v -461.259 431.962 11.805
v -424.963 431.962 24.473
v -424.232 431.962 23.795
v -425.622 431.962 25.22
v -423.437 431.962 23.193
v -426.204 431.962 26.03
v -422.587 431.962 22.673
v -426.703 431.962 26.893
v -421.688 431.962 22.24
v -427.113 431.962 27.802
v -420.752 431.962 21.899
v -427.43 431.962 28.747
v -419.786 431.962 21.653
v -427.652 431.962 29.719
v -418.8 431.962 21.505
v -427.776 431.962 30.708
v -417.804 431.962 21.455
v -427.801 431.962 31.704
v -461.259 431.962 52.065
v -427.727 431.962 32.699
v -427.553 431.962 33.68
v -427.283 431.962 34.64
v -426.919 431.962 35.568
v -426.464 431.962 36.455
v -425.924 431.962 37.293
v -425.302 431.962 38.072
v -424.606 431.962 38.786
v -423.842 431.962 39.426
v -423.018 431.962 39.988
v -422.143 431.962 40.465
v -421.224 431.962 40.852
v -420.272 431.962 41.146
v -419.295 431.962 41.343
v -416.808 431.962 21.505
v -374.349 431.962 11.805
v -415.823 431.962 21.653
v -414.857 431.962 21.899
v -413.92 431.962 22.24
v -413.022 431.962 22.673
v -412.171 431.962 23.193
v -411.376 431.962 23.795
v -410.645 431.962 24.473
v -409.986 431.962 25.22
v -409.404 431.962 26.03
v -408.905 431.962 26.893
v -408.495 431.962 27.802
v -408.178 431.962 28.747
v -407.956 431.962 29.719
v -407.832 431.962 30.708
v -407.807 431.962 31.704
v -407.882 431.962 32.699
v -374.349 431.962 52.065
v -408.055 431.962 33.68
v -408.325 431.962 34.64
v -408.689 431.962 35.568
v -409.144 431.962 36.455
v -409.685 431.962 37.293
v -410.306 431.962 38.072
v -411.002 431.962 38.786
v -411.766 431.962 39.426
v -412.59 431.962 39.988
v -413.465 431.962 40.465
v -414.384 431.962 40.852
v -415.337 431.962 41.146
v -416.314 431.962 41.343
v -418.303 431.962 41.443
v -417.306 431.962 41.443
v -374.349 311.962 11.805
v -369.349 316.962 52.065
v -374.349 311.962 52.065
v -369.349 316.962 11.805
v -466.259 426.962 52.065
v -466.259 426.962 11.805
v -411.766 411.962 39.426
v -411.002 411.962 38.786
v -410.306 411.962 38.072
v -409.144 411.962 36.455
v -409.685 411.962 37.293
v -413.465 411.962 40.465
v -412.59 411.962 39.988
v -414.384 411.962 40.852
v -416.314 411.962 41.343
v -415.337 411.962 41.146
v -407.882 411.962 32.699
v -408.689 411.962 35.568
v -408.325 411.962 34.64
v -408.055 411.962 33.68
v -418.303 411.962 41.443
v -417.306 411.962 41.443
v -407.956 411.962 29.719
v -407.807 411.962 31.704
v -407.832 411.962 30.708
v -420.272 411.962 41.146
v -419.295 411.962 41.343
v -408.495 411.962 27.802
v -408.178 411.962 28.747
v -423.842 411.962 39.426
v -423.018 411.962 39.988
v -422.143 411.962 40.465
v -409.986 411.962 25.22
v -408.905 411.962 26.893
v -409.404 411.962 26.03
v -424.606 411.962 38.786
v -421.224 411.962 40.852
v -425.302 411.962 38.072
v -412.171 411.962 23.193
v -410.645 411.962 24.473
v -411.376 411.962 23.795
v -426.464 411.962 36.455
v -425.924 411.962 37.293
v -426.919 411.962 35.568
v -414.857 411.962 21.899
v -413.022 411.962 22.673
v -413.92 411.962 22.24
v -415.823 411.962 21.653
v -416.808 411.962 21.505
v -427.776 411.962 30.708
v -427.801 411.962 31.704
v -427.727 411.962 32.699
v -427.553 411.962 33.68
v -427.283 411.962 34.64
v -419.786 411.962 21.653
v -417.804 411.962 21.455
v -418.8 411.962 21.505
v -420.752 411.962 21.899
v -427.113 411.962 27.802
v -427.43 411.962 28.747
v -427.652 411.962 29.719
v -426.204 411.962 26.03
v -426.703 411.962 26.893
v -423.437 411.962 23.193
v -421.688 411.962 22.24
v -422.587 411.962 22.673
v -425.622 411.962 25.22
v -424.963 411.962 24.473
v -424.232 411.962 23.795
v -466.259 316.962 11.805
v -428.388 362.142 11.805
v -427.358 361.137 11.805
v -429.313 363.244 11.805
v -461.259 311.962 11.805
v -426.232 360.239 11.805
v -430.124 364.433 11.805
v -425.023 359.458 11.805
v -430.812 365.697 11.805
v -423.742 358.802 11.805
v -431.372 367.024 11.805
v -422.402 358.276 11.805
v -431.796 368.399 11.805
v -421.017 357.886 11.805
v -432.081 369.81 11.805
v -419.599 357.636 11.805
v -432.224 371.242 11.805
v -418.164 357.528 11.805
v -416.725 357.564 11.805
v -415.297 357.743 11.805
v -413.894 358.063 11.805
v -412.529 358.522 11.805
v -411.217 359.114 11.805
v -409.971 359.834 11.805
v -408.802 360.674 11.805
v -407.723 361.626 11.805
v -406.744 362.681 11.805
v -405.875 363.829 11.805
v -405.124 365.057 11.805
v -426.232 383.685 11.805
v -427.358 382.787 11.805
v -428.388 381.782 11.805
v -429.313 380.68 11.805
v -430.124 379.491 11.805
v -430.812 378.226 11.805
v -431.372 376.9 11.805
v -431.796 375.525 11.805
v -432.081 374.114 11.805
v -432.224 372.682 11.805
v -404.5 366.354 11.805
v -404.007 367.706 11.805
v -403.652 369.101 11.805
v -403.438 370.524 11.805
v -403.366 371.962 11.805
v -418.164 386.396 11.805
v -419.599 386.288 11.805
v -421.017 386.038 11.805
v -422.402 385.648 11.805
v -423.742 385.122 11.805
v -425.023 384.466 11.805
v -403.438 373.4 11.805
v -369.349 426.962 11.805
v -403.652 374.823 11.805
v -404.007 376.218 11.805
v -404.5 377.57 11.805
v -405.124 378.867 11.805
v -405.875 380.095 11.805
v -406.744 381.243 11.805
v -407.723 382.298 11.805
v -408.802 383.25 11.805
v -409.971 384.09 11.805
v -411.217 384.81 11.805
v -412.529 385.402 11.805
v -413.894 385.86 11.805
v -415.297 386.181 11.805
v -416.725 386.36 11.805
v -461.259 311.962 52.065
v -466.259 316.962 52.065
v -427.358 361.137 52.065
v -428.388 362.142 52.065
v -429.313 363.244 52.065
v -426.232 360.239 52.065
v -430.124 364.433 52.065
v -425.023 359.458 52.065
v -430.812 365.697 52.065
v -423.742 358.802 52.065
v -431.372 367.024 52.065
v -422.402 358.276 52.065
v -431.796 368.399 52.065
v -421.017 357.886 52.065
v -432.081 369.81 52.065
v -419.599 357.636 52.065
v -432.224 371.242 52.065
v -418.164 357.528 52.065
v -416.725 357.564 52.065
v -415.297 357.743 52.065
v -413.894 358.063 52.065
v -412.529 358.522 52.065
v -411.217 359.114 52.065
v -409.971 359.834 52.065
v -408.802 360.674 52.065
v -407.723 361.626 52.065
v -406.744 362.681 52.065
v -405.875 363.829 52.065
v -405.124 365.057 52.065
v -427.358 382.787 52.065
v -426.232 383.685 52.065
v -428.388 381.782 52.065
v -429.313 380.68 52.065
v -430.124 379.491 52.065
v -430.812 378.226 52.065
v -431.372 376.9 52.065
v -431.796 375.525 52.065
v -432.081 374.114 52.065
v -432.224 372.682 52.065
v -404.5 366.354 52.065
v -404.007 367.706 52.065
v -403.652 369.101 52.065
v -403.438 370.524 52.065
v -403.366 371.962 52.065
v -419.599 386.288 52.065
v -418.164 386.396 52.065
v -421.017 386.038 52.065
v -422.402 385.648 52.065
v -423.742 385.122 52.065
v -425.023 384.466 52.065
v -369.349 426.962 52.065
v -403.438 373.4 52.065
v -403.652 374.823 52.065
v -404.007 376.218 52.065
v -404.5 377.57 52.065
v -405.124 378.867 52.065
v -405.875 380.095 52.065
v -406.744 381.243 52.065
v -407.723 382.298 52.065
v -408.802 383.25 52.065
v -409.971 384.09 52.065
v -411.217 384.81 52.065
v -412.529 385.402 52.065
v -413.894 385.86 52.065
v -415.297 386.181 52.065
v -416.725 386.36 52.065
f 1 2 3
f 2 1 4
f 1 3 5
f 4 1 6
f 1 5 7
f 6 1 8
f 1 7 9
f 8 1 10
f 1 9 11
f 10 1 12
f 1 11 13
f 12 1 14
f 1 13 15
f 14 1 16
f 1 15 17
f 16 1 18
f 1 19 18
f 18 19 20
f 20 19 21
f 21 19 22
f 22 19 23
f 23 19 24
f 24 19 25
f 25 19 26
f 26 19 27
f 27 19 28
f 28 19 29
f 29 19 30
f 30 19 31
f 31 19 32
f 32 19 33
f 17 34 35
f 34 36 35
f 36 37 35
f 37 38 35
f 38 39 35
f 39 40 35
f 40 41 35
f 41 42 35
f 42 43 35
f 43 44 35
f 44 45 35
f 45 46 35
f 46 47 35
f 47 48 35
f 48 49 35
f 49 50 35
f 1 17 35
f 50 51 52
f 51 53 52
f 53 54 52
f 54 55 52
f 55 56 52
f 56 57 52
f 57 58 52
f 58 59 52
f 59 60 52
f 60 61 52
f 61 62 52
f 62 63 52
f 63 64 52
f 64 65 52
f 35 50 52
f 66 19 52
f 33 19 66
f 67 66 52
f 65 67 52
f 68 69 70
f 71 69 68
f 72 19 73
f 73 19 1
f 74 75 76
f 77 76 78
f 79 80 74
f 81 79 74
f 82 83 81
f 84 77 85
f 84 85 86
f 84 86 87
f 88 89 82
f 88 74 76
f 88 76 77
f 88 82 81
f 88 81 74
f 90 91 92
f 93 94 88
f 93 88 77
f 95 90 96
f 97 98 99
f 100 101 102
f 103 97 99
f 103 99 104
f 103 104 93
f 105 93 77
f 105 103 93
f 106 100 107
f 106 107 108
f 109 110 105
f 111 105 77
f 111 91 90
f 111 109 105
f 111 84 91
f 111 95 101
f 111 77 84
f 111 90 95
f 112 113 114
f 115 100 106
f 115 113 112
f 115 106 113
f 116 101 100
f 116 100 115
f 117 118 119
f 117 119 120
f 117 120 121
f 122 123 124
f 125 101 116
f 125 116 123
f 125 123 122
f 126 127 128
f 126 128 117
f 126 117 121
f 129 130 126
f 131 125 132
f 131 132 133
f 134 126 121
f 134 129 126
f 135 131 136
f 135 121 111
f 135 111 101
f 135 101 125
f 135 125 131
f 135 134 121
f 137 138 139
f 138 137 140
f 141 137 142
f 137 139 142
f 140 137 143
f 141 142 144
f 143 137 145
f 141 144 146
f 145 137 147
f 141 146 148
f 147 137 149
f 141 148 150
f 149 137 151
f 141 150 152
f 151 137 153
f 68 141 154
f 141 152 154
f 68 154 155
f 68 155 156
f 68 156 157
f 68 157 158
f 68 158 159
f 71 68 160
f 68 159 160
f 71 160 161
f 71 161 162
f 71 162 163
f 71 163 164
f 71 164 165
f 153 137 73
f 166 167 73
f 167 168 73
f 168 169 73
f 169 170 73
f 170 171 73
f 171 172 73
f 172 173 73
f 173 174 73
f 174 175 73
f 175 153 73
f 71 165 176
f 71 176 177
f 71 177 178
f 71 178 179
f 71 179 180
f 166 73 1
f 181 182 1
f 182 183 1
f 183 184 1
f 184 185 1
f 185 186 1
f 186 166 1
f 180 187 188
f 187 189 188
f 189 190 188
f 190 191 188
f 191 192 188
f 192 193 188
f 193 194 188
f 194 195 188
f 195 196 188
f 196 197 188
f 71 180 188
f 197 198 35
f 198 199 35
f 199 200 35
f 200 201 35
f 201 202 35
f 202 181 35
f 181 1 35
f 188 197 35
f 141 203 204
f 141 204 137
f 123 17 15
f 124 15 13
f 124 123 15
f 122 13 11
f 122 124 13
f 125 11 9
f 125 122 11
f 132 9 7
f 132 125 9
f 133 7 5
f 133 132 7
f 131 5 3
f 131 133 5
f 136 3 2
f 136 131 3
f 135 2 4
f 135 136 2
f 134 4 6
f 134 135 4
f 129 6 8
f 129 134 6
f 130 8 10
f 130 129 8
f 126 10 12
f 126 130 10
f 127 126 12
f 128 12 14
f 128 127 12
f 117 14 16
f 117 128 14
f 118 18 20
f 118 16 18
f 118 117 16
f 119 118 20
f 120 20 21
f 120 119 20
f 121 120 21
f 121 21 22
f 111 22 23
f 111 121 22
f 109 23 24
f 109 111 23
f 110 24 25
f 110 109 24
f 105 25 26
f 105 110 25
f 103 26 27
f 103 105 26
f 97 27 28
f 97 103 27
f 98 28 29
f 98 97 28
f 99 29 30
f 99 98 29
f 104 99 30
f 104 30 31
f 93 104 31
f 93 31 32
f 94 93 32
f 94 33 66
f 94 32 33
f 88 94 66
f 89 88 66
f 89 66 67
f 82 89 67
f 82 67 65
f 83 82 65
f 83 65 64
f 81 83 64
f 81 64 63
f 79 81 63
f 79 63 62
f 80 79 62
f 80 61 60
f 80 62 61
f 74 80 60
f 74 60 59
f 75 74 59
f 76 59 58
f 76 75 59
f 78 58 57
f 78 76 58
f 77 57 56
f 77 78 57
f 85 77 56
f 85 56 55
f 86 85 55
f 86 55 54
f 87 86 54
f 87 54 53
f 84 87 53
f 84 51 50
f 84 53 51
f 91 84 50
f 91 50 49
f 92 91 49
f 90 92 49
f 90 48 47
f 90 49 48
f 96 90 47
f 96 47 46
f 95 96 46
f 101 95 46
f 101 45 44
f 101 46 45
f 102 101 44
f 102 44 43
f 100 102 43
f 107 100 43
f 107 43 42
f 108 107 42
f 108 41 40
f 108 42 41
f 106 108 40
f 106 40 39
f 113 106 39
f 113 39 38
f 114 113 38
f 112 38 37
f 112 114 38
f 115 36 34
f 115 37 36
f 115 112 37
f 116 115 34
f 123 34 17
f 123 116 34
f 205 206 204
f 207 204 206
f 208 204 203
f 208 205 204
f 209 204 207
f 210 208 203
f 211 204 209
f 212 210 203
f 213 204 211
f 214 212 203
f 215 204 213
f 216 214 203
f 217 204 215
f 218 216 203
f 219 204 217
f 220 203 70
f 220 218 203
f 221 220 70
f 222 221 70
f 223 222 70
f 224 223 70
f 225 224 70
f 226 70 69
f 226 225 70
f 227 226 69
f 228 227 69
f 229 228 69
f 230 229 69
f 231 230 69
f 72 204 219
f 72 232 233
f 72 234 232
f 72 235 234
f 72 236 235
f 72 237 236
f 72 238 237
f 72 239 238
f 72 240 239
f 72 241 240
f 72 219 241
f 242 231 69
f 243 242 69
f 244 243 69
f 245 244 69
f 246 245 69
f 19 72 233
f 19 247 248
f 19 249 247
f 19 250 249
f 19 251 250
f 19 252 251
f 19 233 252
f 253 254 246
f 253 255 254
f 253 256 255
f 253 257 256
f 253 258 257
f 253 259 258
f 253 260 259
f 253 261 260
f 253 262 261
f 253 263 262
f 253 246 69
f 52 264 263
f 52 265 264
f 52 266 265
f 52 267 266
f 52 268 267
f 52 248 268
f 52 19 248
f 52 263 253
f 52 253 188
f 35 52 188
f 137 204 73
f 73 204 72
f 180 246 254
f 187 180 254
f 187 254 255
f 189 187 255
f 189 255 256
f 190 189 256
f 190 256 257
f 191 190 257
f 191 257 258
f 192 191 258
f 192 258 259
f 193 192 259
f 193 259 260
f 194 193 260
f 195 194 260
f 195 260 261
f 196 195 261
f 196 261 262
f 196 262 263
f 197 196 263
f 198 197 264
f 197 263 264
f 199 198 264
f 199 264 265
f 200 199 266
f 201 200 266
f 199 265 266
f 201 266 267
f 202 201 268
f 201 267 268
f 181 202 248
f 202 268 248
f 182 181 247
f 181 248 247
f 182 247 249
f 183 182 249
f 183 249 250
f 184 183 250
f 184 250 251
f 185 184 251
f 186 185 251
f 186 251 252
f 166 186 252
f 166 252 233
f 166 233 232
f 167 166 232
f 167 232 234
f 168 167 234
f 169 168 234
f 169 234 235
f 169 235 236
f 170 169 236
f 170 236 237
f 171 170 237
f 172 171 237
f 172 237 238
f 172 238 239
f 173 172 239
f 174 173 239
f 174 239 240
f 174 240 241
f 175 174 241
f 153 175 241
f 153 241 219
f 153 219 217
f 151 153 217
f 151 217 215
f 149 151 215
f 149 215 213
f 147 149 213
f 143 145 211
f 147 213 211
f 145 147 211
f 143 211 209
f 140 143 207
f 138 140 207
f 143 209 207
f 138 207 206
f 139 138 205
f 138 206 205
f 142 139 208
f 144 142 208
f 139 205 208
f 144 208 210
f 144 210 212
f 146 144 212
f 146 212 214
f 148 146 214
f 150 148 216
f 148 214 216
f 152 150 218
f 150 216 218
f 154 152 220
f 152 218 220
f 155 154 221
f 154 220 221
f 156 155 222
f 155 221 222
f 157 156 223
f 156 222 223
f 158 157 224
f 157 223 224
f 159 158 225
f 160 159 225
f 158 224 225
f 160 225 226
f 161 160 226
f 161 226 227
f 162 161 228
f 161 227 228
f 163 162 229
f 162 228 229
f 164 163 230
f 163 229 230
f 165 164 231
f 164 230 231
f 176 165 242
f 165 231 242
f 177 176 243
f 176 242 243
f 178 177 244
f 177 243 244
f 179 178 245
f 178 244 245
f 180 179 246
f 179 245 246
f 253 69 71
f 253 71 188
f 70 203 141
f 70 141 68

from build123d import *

# Parameters (mm, degrees)
SKETCH_1_W               = 96.91
SKETCH_1_H               = 120
EXTRUDE_1_DEPTH          = 40.26
CUT_EXTRUDE_1_DEPTH      = 637.874859919
CUT_EXTRUDE_1_DEPTH_BACK = 637.874859919
SKETCH_2_R               = 10
CUT_EXTRUDE_2_DEPTH      = 485.260622689
CUT_EXTRUDE_2_DEPTH_BACK = 20
SKETCH_3_R               = 10
CHAMFER_1_SIZE           = 5
SKETCH_4_R               = 14.438127561
CUT_EXTRUDE_3_DEPTH      = 500


with BuildPart() as part:
    # 草图1 → 凸台-拉伸1 (new body)
    with BuildSketch(Plane.XY.offset(52.065067551)):
        with Locations((-417.804133345, 371.961966114)):
            Rectangle(SKETCH_1_W, SKETCH_1_H)
    extrude(amount=-EXTRUDE_1_DEPTH)

    # 草图2 → 切除-拉伸1 (cut, two sides: drawn at the far end of the back side and taken through both)
    with BuildSketch(Plane.XY.offset(52.065067551).offset(-CUT_EXTRUDE_1_DEPTH_BACK)):
        with Locations((-417.804133345, 371.961966114)):
            Circle(SKETCH_2_R)
        with Locations((-494.338767254, 524.640290491)):
            Circle(SKETCH_2_R)
    extrude(amount=CUT_EXTRUDE_1_DEPTH + CUT_EXTRUDE_1_DEPTH_BACK, mode=Mode.SUBTRACT)

    # 草图3 → 切除-拉伸2 (cut, two sides: drawn at the far end of the back side and taken through both)
    with BuildSketch(Plane(origin=(0, 431.961966114, 0), x_dir=(1, 0, 0), z_dir=(0, 1, 0)).offset(-CUT_EXTRUDE_2_DEPTH_BACK)):
        with Locations(Location((-417.804133345, -31.455067551, 0), (0, 0, 90))):
            Circle(SKETCH_3_R)
    extrude(amount=CUT_EXTRUDE_2_DEPTH + CUT_EXTRUDE_2_DEPTH_BACK, mode=Mode.SUBTRACT)

    # 倒角1
    chamfer_1_edges = [part.edges().sort_by_distance(p)[0] for p in [
        (-369.349133345, 311.961966114, 31.935067551),
        (-369.349133345, 431.961966114, 31.935067551),
        (-466.259133345, 431.961966114, 31.935067551),
        (-466.259133345, 311.961966114, 31.935067551),
    ]]
    chamfer(chamfer_1_edges, length=CHAMFER_1_SIZE)

    # 草图4 → 切除-拉伸3 (cut)
    with BuildSketch(Plane.XY.offset(52.065067551)):
        with Locations((-417.804133345, 371.961966114)):
            Circle(SKETCH_4_R)
    extrude(amount=-CUT_EXTRUDE_3_DEPTH, mode=Mode.SUBTRACT)


solid = part.part
